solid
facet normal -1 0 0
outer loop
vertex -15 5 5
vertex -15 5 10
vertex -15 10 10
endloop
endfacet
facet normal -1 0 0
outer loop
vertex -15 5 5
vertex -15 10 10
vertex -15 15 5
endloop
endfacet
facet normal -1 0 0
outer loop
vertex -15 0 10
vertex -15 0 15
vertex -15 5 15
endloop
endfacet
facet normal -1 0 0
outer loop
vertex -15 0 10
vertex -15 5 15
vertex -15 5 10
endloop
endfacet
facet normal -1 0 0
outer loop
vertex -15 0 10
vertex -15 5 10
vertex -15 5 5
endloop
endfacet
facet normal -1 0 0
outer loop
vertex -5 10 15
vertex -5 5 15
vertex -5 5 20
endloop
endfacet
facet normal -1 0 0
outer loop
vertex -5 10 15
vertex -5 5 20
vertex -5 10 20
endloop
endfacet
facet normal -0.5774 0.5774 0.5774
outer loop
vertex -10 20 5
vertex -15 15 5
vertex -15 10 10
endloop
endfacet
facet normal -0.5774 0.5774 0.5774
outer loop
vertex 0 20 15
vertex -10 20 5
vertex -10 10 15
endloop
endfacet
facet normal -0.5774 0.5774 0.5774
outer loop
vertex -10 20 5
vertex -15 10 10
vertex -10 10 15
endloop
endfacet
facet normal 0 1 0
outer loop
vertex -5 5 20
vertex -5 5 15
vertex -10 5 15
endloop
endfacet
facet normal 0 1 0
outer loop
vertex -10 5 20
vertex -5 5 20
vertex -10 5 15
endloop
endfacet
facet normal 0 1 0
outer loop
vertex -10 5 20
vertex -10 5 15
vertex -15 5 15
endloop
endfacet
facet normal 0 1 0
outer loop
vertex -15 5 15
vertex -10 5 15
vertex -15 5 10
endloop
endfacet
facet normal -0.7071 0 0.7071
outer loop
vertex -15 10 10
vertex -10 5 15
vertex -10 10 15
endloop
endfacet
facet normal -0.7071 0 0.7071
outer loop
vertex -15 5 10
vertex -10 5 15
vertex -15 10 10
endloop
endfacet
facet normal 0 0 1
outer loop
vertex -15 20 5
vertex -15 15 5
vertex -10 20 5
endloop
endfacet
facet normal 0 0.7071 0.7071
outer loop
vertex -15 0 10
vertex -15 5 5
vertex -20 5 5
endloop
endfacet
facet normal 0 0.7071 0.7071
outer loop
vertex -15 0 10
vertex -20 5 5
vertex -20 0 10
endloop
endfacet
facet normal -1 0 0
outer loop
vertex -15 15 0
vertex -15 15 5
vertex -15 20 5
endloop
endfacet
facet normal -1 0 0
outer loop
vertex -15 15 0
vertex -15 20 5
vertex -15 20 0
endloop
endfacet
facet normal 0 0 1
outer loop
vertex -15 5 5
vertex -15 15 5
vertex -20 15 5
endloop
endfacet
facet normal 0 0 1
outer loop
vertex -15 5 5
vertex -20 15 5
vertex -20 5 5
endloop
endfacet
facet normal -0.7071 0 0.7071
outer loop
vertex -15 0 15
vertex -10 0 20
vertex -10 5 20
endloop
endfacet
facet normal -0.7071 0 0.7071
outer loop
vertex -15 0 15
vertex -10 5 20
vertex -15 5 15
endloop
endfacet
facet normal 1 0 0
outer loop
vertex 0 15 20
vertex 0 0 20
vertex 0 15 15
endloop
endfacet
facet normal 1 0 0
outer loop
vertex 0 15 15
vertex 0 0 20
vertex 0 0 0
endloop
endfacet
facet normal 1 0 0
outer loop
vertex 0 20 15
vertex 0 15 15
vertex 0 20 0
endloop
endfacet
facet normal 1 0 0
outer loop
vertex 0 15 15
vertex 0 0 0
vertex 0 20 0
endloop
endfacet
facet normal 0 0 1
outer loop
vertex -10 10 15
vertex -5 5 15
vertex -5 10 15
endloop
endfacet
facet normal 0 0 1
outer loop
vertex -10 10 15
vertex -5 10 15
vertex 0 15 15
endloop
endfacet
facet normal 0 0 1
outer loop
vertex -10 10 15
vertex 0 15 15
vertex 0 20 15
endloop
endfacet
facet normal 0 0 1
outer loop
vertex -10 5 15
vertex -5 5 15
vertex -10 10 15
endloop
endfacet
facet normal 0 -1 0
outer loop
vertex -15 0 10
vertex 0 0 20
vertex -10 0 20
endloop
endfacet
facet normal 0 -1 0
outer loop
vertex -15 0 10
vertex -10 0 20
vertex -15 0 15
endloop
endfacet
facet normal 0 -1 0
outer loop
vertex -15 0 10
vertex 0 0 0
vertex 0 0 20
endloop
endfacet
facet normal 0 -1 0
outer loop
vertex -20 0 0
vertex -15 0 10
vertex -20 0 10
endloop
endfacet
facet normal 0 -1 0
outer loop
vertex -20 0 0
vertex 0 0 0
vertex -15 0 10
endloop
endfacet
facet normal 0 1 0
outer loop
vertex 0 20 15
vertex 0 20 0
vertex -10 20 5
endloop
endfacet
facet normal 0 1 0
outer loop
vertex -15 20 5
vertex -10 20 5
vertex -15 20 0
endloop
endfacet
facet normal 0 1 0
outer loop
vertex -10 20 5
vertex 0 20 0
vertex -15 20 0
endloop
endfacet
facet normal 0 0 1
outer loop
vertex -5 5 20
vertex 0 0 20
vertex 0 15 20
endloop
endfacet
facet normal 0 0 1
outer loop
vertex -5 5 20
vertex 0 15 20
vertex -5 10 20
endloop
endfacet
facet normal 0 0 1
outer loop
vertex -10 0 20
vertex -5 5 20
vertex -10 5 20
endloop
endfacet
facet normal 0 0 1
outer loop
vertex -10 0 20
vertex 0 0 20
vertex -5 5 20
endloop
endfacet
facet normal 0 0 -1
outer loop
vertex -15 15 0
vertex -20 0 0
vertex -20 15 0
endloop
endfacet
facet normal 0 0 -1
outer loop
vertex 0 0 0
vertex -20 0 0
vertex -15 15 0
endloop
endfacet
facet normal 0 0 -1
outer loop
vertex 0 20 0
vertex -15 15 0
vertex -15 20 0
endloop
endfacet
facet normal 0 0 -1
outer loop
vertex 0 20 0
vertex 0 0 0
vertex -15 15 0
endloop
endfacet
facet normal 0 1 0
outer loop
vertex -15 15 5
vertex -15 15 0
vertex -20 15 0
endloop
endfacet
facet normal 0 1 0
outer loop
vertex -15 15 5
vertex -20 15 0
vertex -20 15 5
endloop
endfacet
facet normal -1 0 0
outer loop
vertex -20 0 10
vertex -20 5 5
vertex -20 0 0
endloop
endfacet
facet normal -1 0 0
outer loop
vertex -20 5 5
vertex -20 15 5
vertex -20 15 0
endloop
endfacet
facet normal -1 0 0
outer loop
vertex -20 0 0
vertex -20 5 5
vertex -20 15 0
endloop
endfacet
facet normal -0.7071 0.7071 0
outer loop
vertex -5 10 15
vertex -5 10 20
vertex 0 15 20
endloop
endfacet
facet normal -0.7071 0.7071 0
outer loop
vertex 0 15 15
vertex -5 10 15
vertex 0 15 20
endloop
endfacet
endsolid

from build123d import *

# Parameters (mm, degrees)
BOSS_EXTRUDE2_DEPTH = 20
BOSS_EXTRUDE4_DEPTH = 5
BOSS_EXTRUDE6_DEPTH = 20
CUT_EXTRUDE1_DEPTH  = 20
SKETCH5_W           = 5
SKETCH5_H           = 15
BOSS_EXTRUDE7_DEPTH = 5
CUT_EXTRUDE2_DEPTH  = 5
BOSS_EXTRUDE8_DEPTH = 5


with BuildPart() as part:
    # Sketch2 → Boss-Extrude2 (new body)
    with BuildSketch(Plane(origin=(0, 0, 0), x_dir=(1, 0, 0), z_dir=(0, 1, 0))):
        Polygon((-15, 0), (0, 0), (0, -15), (-10, -5), (-15, -5), align=None)
    extrude(amount=BOSS_EXTRUDE2_DEPTH)

    # Sketch3 → Boss-Extrude4 (add)
    with BuildSketch(Plane.ZY.offset(15)):
        Polygon((5, 15), (5, 5), (10, 0), (0, 0), (0, 15), align=None)
    extrude(amount=BOSS_EXTRUDE4_DEPTH)

    # Sketch4 → Boss-Extrude6 (add)
    with BuildSketch(Plane(origin=(0, 0, 0), x_dir=(-1, 0, 0), z_dir=(0, -1, 0))):
        Polygon((10, -15), (15, -10), (15, -5), (10, -5), (0, -15), align=None)
    extrude(amount=-BOSS_EXTRUDE6_DEPTH)

    # 3DSketch2 → Cut-Extrude1 (cut, along a direction that is not the sketch's normal)
    with BuildSketch(Plane(origin=(-10, 20, 5), x_dir=(0.7071067811865476, 0, 0.7071067811865475), z_dir=(0.5773502691896257, -0.577350269189626, -0.5773502691896258))):
        Polygon((0, 0), (14.142135624, 0), (7.071067812, 12.247448714), (0, 12.247448714), (-3.535533906, 6.123724357), align=None)
    extrude(amount=-CUT_EXTRUDE1_DEPTH, dir=(0, -1, 0), mode=Mode.SUBTRACT)

    # Sketch5 → Boss-Extrude7 (add)
    with BuildSketch(Plane.XY.offset(15)):
        with Locations((-2.5, 7.5)):
            Rectangle(SKETCH5_W, SKETCH5_H)
    extrude(amount=BOSS_EXTRUDE7_DEPTH)

    # Sketch6 → Cut-Extrude2 (cut)
    with BuildSketch(Plane.XY.offset(20)):
        Polygon((0, 15), (-5, 15), (-5, 10), align=None)
    extrude(amount=-CUT_EXTRUDE2_DEPTH, mode=Mode.SUBTRACT)

    # Sketch7 → Boss-Extrude8 (add)
    with BuildSketch(Plane(origin=(0, 0, 0), x_dir=(-1, 0, 0), z_dir=(0, -1, 0))):
        Polygon((15, -10), (10, -15), (5, -15), (5, -20), (10, -20), (15, -15), align=None)
    extrude(amount=-BOSS_EXTRUDE8_DEPTH)


solid = part.part
